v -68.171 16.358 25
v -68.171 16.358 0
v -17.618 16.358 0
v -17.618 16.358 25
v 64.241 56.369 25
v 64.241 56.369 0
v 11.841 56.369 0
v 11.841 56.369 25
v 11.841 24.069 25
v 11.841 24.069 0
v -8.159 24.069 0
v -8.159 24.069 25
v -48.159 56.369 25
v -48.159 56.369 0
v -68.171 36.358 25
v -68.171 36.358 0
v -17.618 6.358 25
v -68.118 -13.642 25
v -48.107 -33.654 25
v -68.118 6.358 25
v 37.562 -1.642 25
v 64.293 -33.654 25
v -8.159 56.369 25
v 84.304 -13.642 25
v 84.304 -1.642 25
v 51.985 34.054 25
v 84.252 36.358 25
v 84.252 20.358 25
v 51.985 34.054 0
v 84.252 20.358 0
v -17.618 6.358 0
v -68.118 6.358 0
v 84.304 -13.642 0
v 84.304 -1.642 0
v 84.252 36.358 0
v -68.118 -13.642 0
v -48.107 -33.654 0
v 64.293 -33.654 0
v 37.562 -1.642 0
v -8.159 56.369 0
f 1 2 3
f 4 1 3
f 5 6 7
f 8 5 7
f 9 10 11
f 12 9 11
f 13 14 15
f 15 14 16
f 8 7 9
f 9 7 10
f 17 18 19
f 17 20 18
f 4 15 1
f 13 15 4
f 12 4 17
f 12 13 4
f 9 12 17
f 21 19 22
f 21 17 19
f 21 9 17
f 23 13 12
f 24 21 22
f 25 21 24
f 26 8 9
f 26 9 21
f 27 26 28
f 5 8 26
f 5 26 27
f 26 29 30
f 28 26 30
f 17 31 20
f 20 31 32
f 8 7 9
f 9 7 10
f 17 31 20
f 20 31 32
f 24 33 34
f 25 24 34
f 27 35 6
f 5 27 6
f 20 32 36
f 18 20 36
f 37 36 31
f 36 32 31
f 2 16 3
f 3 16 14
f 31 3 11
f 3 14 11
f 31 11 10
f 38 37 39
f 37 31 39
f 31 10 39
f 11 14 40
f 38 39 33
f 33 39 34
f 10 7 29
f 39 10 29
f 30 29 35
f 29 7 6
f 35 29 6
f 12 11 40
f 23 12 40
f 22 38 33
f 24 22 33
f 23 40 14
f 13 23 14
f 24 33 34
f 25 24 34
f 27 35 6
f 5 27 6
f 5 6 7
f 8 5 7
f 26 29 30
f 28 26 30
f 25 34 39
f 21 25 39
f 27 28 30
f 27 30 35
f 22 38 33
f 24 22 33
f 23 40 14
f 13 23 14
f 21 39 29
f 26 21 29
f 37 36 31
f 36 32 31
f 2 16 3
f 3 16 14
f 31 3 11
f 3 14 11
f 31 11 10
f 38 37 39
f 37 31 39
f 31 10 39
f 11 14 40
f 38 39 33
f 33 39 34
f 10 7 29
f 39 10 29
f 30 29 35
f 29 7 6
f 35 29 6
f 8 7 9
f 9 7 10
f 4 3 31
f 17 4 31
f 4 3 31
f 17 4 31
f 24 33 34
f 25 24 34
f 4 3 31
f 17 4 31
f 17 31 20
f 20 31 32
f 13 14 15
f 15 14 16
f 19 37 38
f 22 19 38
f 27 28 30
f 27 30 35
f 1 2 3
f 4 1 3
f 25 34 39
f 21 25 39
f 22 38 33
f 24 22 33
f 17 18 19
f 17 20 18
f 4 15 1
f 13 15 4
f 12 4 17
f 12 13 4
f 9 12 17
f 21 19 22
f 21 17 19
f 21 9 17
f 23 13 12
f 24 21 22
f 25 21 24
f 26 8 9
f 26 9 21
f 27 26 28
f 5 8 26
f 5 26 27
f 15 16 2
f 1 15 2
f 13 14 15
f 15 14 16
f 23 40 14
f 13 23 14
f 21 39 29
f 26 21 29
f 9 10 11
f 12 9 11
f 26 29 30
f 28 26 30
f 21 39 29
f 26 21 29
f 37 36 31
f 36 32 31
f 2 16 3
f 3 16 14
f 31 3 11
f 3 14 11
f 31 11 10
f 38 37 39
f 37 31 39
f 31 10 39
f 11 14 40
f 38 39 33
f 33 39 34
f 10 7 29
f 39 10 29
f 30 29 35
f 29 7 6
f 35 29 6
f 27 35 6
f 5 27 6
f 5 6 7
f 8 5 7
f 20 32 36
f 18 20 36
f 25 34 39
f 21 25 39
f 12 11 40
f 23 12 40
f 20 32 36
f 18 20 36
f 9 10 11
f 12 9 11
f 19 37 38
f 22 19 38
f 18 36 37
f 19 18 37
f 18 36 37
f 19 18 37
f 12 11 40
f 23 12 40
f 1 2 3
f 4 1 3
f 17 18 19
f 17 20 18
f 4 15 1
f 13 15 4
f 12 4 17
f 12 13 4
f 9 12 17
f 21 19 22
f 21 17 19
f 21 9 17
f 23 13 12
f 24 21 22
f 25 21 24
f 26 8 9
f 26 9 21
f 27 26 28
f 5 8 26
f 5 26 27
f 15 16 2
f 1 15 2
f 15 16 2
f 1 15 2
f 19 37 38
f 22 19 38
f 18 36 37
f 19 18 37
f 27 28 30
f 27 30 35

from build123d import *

# Parameters (mm, degrees)
F1_DEPTH = 25
F2_DEPTH = 25
F3_DEPTH = 25


with BuildPart() as f1:
    # F0 (on Top) → F1 (new body)
    with BuildSketch(Plane.XY):
        Polygon((-68.118282, -13.642474), (-48.10716, -33.653596), (64.29284, -33.653596), (84.303962, -13.642474), (84.303962, -1.642474), (82.862166, -1.642474), (37.562166, -1.642474), (51.98452, 34.054104), (84.251637, 20.357526), (84.251637, 36.357526), (64.240515, 56.368648), (11.840515, 56.368648), (11.840515, 24.068648), (-8.159485, 24.068648), (-8.159485, 56.368648), (-48.159485, 56.368648), (-68.170607, 36.357526), (-68.170607, 16.357526), (-17.618282, 16.357526), (-17.618282, 6.357526), (-68.118282, 6.357526), align=None)
    extrude(amount=F1_DEPTH)


with BuildPart() as f2:
    # F0 (on Top) → F2 (new body)
    with BuildSketch(Plane.XY):
        Polygon((-68.118282, -13.642474), (-48.10716, -33.653596), (64.29284, -33.653596), (84.303962, -13.642474), (84.303962, -1.642474), (82.862166, -1.642474), (37.562166, -1.642474), (51.98452, 34.054104), (84.251637, 20.357526), (84.251637, 36.357526), (64.240515, 56.368648), (11.840515, 56.368648), (11.840515, 24.068648), (-8.159485, 24.068648), (-8.159485, 56.368648), (-48.159485, 56.368648), (-68.170607, 36.357526), (-68.170607, 16.357526), (-17.618282, 16.357526), (-17.618282, 6.357526), (-68.118282, 6.357526), align=None)
    extrude(amount=F2_DEPTH)


with BuildPart() as f3:
    # F0 (on Top) → F3 (new body)
    with BuildSketch(Plane.XY):
        Polygon((-68.118282, -13.642474), (-48.10716, -33.653596), (64.29284, -33.653596), (84.303962, -13.642474), (84.303962, -1.642474), (82.862166, -1.642474), (37.562166, -1.642474), (51.98452, 34.054104), (84.251637, 20.357526), (84.251637, 36.357526), (64.240515, 56.368648), (11.840515, 56.368648), (11.840515, 24.068648), (-8.159485, 24.068648), (-8.159485, 56.368648), (-48.159485, 56.368648), (-68.170607, 36.357526), (-68.170607, 16.357526), (-17.618282, 16.357526), (-17.618282, 6.357526), (-68.118282, 6.357526), align=None)
    extrude(amount=F3_DEPTH)


solid = Compound([f1.part, f2.part, f3.part])
